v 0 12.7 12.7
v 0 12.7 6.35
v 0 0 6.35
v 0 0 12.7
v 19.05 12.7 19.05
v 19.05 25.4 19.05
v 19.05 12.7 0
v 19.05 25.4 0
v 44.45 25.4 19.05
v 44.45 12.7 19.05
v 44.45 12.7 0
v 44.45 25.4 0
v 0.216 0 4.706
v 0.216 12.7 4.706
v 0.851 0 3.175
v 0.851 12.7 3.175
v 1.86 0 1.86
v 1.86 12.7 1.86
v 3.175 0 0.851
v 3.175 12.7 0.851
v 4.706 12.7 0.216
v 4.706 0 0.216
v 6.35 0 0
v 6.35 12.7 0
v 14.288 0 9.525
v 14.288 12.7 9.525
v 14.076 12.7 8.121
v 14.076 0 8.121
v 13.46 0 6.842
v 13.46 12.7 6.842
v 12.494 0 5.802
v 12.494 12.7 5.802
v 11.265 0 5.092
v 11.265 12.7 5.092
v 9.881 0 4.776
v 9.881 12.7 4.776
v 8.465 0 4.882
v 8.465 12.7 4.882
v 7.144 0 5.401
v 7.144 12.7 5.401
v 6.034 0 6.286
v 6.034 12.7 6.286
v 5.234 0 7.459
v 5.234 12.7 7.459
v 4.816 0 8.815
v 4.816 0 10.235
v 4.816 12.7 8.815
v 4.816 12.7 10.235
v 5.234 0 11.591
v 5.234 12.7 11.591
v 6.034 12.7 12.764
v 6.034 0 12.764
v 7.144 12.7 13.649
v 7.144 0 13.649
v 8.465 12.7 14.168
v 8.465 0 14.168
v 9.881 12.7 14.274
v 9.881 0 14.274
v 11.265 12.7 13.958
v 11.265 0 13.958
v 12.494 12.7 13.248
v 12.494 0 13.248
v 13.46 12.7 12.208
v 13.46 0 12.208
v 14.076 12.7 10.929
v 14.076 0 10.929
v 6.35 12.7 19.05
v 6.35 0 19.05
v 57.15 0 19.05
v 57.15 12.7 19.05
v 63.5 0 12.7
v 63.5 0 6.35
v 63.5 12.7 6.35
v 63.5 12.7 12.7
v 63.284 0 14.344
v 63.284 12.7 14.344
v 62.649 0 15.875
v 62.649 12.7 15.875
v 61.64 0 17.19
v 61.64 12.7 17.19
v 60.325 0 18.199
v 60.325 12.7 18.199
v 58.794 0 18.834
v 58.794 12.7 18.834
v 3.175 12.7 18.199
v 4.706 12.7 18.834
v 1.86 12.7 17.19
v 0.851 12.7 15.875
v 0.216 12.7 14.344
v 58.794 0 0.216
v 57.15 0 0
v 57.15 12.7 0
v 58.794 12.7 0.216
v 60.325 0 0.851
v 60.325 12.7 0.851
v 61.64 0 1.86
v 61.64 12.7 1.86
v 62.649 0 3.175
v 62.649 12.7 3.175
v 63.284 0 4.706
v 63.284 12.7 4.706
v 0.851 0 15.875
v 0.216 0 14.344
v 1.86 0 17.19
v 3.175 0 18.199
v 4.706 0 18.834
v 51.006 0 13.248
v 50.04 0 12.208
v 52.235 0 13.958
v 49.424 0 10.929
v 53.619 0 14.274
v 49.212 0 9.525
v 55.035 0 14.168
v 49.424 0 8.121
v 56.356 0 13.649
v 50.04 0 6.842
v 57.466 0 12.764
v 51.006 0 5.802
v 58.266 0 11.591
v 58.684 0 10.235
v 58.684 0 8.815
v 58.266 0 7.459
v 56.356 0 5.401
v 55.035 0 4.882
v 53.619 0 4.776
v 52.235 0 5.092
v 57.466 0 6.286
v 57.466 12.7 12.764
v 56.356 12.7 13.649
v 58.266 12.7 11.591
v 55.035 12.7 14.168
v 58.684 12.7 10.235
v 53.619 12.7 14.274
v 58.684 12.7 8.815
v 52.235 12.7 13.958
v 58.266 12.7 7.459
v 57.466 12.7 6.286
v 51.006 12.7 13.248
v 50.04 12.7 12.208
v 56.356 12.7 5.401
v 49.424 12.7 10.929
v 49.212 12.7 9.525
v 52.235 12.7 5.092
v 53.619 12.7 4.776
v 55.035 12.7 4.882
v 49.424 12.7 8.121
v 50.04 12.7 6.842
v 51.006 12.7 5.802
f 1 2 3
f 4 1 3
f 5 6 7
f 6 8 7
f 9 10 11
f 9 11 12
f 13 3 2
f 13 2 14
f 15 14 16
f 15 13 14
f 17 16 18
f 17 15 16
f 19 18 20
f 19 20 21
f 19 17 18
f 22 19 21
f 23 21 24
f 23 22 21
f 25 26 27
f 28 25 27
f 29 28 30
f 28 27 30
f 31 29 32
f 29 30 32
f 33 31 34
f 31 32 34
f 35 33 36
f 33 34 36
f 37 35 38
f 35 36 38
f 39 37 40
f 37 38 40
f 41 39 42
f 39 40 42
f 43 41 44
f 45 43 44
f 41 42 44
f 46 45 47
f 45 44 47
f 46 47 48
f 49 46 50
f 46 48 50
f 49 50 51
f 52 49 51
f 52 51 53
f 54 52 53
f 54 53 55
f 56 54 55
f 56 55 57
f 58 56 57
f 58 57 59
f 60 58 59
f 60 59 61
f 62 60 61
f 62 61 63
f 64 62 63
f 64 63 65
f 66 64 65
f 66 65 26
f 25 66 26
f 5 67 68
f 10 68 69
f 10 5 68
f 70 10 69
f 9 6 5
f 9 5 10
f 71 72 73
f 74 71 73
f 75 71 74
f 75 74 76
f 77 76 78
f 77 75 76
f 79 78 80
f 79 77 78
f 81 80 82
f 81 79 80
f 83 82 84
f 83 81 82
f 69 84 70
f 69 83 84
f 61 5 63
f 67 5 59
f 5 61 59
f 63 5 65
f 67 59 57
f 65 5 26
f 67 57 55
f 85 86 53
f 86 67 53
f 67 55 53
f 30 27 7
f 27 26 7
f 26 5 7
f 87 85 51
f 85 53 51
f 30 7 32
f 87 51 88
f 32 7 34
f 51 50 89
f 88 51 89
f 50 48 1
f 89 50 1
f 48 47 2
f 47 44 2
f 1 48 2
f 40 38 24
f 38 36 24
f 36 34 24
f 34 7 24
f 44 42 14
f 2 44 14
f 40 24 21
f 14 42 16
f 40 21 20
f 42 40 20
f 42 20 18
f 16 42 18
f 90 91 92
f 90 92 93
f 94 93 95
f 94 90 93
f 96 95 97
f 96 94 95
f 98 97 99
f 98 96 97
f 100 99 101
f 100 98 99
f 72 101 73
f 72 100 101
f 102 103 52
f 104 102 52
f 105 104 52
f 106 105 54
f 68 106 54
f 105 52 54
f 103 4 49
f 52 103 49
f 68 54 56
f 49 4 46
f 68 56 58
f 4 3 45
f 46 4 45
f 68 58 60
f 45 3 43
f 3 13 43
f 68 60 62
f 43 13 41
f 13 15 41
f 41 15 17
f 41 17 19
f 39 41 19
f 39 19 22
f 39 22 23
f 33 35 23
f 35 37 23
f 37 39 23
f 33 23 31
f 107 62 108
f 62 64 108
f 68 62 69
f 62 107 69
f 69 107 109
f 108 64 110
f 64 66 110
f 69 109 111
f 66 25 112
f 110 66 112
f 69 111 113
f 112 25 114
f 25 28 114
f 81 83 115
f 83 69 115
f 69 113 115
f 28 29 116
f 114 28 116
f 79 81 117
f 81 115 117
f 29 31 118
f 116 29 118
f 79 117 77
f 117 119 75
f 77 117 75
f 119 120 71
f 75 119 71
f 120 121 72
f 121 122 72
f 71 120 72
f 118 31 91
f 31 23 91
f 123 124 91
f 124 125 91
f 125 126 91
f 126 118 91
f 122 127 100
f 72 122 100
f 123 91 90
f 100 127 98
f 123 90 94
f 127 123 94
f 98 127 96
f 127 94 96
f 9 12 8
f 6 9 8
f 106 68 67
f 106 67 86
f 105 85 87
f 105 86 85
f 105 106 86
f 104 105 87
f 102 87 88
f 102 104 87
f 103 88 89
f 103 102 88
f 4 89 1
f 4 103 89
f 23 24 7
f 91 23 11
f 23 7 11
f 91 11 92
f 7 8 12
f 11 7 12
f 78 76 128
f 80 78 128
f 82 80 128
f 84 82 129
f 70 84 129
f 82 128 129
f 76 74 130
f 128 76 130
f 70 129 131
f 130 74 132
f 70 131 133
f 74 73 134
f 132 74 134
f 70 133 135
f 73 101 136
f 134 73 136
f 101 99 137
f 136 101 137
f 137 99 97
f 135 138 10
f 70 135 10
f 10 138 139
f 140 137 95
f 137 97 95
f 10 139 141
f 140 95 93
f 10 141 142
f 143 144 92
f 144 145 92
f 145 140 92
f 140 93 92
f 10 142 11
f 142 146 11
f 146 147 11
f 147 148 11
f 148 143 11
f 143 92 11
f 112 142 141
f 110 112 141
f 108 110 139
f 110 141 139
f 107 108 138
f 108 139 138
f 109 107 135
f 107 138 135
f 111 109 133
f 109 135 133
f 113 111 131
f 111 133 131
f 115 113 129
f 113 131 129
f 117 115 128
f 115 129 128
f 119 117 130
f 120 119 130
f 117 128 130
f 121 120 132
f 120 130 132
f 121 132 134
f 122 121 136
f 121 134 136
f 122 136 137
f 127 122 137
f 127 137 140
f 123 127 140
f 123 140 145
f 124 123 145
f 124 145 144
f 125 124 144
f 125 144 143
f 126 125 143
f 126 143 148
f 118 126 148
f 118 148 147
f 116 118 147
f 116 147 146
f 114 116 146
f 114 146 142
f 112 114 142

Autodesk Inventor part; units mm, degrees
ref_plane "YZ Plane" through (0, 0, 0) normal (1, 0, 0) x (0, 1, 0)
ref_plane "XZ Plane" through (0, 0, 0) normal (0, 1, 0) x (-1, 0, 0)
ref_plane "XY Plane" through (0, 0, 0) normal (0, 0, 1) x (1, 0, 0)
sketch "Sketch1" plane through (0, 0, 0) normal (0, 0, 1) x (1, 0, 0)
  line L0 (0, 0) -> (19.05, 0)
  line L1 (19.05, 12.7) -> (0, 12.7)
  line L2 (0, 12.7) -> (0, 0)
  line L3 (19.05, 0) -> (31.75, 0)
  line L4 (31.75, 0) -> (31.75, 25.4)
  line L5 (31.75, 25.4) -> (19.05, 25.4)
  line L6 (19.05, 25.4) -> (19.05, 12.7)
  dimension "d0" = 19.05
  dimension "d2" = 12.7
  dimension "d3" = 25.4
  dimension "d4" = 12.7
extrude "Extrusion1" add sketch "Sketch1" along normal blind 19.05
fillet "Fillet1" radius 6.35 2 edges at (0, 6.35, 19.05) (0, 6.35, 0)
sketch "Sketch2" plane through (19.05, 12.7, 19.05) normal (0, 1, 0) x (1, 0, 0)
  line L0 (0, 19.05) -> (-12.7, 19.05) projected
  line L1 (0, 19.05) -> (0, 0) projected
  circle A0 centre (-9.525, 9.525) radius 4.7625
  line L2 (0, 19.05) -> (-6.1574, 12.8926)
  line L3 (-12.8926, 6.1574) -> (-19.05, 0)
  line L4 (0, 0) -> (-6.1574, 6.1574)
  line L5 (-12.8926, 12.8926) -> (-19.05, 19.05)
  dimension "d8" = 9.525
extrude "Extrusion2" cut sketch "Sketch2" against normal through all contours A0
mirror "Mirror1" about plane through (31.75, 0, 0) normal (1, 0, 0) of "Extrusion1", "Extrusion2", "Fillet1"
properties part number "Mirror Feature Practice"
